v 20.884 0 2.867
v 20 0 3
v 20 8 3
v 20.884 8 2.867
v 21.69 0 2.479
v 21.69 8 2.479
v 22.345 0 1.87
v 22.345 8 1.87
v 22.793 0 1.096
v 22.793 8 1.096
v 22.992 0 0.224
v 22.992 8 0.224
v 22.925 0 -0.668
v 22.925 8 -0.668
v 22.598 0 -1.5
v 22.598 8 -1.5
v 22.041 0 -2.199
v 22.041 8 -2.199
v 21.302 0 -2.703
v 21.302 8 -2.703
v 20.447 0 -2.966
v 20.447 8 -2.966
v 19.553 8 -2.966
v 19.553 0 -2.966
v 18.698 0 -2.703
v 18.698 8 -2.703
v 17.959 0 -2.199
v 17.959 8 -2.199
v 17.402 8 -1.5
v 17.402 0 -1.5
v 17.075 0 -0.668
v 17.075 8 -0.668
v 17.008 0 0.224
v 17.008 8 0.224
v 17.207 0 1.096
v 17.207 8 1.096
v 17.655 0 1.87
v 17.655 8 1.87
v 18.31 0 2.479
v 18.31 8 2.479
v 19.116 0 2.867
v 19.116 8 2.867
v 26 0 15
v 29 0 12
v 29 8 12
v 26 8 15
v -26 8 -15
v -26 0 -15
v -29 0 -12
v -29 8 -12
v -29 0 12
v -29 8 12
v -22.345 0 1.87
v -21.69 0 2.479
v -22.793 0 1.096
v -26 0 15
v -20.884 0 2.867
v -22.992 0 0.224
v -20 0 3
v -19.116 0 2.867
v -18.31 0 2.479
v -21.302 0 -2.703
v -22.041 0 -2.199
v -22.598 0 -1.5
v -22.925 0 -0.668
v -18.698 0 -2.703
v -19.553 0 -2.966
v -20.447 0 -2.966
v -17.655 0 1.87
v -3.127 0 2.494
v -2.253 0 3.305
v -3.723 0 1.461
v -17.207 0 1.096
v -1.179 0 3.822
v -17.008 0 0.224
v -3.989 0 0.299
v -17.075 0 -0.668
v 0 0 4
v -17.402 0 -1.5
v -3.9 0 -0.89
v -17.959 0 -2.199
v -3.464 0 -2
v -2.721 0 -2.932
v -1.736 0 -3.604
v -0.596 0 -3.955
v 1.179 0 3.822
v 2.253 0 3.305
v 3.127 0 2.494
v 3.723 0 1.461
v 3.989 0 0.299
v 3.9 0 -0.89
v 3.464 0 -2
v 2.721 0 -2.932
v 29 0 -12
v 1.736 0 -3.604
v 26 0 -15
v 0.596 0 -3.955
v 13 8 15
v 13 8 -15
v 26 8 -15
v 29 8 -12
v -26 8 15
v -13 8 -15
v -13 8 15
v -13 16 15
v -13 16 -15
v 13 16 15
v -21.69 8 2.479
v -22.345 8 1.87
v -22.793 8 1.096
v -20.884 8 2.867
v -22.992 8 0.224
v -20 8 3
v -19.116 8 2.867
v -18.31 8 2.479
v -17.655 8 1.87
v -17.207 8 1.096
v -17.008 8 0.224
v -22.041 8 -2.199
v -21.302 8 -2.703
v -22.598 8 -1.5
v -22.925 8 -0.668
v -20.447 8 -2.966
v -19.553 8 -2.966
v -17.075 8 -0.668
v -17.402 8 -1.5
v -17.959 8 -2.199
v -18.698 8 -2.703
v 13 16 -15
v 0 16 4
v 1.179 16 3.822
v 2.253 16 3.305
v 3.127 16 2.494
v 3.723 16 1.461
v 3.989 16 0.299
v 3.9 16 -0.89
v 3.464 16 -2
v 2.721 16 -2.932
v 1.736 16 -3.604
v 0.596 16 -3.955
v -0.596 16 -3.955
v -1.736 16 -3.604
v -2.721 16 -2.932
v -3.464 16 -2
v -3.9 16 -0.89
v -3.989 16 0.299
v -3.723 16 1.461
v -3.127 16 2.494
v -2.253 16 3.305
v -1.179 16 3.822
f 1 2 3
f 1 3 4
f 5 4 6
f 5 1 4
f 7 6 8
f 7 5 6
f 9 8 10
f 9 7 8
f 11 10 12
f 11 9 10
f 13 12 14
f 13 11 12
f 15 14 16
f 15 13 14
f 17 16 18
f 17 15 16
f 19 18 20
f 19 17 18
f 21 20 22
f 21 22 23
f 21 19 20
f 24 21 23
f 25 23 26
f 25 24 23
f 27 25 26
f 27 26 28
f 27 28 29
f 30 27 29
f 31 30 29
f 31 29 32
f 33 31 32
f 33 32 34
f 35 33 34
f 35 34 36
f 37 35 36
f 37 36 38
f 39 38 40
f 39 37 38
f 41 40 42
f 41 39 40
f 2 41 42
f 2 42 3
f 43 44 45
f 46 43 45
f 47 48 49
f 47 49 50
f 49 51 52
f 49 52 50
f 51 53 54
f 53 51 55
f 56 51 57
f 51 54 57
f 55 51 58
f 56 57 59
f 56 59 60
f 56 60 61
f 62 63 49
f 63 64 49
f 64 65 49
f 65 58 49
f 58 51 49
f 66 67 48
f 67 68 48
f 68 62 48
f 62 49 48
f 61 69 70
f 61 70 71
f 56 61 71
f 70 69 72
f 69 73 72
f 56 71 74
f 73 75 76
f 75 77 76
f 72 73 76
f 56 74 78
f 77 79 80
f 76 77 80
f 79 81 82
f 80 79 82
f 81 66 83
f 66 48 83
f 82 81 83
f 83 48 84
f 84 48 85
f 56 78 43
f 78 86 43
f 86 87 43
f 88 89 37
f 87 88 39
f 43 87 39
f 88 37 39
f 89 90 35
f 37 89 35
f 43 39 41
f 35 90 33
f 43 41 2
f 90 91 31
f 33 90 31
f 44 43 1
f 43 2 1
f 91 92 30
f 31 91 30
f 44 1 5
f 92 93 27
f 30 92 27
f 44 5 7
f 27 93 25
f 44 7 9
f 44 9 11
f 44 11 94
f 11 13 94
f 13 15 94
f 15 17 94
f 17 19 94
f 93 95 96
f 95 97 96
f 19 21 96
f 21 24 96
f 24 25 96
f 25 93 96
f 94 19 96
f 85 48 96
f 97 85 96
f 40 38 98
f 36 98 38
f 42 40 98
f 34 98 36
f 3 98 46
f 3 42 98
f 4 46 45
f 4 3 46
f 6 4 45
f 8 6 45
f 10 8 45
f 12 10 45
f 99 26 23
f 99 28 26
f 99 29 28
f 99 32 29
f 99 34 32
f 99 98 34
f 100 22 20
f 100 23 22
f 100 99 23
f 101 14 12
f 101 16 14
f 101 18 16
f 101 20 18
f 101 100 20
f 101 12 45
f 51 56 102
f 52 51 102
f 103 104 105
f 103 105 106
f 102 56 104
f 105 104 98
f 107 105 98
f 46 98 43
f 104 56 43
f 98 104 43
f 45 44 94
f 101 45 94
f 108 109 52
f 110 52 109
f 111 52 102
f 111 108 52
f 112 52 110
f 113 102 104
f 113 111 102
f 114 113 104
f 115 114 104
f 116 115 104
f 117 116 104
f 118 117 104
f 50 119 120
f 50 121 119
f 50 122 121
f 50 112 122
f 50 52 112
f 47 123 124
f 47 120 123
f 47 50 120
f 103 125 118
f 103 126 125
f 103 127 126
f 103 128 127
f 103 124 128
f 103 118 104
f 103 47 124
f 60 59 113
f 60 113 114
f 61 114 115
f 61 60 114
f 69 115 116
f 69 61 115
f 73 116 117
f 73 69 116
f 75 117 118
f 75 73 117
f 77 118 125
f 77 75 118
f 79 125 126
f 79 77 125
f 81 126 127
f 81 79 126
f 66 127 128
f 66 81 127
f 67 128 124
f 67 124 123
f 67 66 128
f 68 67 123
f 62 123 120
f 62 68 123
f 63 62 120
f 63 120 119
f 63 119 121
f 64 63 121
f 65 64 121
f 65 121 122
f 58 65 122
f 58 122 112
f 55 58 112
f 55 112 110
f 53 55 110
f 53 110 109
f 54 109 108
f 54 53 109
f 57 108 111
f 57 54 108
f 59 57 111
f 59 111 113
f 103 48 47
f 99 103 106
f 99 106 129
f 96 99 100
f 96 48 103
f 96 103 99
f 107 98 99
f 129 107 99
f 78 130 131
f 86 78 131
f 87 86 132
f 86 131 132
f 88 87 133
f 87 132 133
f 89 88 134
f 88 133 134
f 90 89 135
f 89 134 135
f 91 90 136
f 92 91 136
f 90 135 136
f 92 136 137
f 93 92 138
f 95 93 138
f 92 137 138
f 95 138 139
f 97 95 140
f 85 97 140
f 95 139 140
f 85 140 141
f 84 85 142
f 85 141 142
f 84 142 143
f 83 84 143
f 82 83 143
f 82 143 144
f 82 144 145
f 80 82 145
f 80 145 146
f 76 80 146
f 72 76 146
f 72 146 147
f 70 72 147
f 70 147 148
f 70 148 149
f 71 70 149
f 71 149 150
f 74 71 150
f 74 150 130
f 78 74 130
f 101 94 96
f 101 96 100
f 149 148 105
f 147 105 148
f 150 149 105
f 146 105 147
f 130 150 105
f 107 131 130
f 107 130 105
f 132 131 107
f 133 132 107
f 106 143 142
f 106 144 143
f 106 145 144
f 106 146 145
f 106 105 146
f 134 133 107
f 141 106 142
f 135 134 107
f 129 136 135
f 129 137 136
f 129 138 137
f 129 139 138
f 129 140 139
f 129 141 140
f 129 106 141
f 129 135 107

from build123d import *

# Parameters (mm, degrees)
SKETCH1_W           = 58
SKETCH1_H           = 30
SKETCH1_R           = 3
BOSS_EXTRUDE1_DEPTH = 8
SKETCH2_W           = 26
SKETCH2_H           = 30
BOSS_EXTRUDE2_DEPTH = 8
SKETCH3_R           = 4
CUT_EXTRUDE1_DEPTH  = 37.359317925
CHAMFER1_SIZE       = 3


with BuildPart() as part:
    # Sketch1 → Boss-Extrude1 (new body)
    with BuildSketch(Plane(origin=(0, 0, 0), x_dir=(1, 0, 0), z_dir=(0, 1, 0))):
        Rectangle(SKETCH1_W, SKETCH1_H)
        with Locations(Location((-20, 0, 0), (0, 0, 270))):
            Circle(SKETCH1_R, mode=Mode.SUBTRACT)
        with Locations(Location((20, 0, 0), (0, 0, 270))):
            Circle(SKETCH1_R, mode=Mode.SUBTRACT)
    extrude(amount=BOSS_EXTRUDE1_DEPTH)

    # Sketch2 → Boss-Extrude2 (add)
    with BuildSketch(Plane(origin=(0, 8, 0), x_dir=(1, 0, 0), z_dir=(0, 1, 0))):
        Rectangle(SKETCH2_W, SKETCH2_H)
    extrude(amount=BOSS_EXTRUDE2_DEPTH)

    # Sketch3 → Cut-Extrude1 (cut, through all)
    with BuildSketch(Plane(origin=(0, 16, 0), x_dir=(1, 0, 0), z_dir=(0, 1, 0))):
        with Locations(Location((0, 0, 0), (0, 0, 270))):
            Circle(SKETCH3_R)
    extrude(amount=-CUT_EXTRUDE1_DEPTH, mode=Mode.SUBTRACT)

    # Chamfer1
    chamfer1_edges = [part.edges().sort_by_distance(p)[0] for p in [
        (29, 4, 15),
        (-29, 4, 15),
        (-29, 4, -15),
        (29, 4, -15),
    ]]
    chamfer(chamfer1_edges, length=CHAMFER1_SIZE)


solid = part.part
